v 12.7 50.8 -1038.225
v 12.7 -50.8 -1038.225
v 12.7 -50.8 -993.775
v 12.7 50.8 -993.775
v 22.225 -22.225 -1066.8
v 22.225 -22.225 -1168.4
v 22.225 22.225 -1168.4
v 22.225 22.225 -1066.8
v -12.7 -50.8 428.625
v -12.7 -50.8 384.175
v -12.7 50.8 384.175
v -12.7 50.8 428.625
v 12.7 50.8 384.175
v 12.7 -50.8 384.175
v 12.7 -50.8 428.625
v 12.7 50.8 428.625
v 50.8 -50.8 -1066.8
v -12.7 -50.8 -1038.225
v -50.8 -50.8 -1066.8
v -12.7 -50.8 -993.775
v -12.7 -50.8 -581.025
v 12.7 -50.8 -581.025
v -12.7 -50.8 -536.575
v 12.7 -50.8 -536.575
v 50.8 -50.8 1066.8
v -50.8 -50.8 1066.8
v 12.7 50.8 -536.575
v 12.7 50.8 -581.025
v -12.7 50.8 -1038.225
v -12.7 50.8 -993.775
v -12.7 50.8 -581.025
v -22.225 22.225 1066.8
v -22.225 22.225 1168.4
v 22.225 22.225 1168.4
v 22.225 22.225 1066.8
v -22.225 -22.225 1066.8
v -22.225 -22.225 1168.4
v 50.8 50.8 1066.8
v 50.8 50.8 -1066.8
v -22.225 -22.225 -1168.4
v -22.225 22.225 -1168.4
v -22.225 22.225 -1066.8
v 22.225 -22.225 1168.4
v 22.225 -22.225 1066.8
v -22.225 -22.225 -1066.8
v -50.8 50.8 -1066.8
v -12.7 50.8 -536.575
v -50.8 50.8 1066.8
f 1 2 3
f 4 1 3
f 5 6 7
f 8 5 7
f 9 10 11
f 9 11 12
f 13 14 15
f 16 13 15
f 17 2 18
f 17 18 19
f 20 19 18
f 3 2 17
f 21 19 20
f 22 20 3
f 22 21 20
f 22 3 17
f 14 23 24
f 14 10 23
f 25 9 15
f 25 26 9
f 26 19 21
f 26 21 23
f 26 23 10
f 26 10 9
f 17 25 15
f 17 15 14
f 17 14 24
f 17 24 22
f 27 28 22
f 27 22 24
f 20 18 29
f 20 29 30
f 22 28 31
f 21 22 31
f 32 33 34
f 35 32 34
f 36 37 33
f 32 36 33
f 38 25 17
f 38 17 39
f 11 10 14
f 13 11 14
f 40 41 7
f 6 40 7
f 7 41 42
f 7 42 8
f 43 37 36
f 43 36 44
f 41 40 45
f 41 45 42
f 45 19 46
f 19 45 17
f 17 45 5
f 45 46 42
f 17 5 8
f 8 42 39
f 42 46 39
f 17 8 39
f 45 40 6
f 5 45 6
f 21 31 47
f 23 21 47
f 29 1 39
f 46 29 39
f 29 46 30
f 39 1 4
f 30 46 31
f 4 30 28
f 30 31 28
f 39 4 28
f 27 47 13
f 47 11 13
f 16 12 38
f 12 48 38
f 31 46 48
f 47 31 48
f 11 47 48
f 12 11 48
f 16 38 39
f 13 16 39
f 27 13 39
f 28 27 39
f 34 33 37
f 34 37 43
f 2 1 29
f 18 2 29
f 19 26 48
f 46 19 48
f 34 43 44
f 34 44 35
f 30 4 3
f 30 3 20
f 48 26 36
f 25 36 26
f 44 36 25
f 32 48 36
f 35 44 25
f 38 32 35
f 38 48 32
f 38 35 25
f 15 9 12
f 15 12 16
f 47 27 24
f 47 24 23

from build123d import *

# Parameters (mm, degrees)
F0_W     = 101.6
F0_H     = 101.6
F1_DEPTH = 1168.4
F2_W     = 101.6
F2_H     = 101.6
F2_W_2   = 44.45
F2_H_2   = 44.45
F3_DEPTH = 101.6
F4_W     = 25.4
F4_H     = 44.45
F5_DEPTH = 101.601
F6_W     = 25.4
F6_H     = 44.45
F7_DEPTH = 101.601
F8_W     = 25.4
F8_H     = 44.45
F9_DEPTH = 101.601


# Not quite as in the source:
# - a pattern or mirror of a feature is missing from the dataset's text; its kind, count and spacing are read off the source's solid


with BuildPart() as f1:
    # F0 (on Top) → F1 (new body, symmetric)
    with BuildSketch(Plane.XY):
        Rectangle(F0_W, F0_H)
    extrude(amount=F1_DEPTH, both=True)

    # F2 (on face) → F3 (cut)
    with BuildSketch(Plane.XY.offset(1168.4)):
        Rectangle(F2_W, F2_H)
        Rectangle(F2_W_2, F2_H_2, mode=Mode.SUBTRACT)
    f3 = extrude(amount=-F3_DEPTH, mode=Mode.SUBTRACT)

    # F3_copies: F3 across plane
    add(f3.mirror(Plane(origin=(0, 0, 0), x_dir=(-1, 0, 0), z_dir=(0, 0, -1))), mode=Mode.SUBTRACT)

    # F4 (on face) → F5 (cut, through all)
    with BuildSketch(Plane.XZ.offset(50.8)):
        with Locations((0, 406.4)):
            Rectangle(F4_W, F4_H)
    extrude(amount=-F5_DEPTH, mode=Mode.SUBTRACT)

    # F6 (on face) → F7 (cut, through all)
    with BuildSketch(Plane(origin=(0, 50.8, 0), x_dir=(-1, 0, 0), z_dir=(0, 1, 0))):
        with Locations((0, -558.8)):
            Rectangle(F6_W, F6_H)
    extrude(amount=-F7_DEPTH, mode=Mode.SUBTRACT)

    # F8 (on face) → F9 (cut, through all)
    with BuildSketch(Plane(origin=(0, 50.8, 0), x_dir=(-1, 0, 0), z_dir=(0, 1, 0))):
        with Locations((0, -1016)):
            Rectangle(F8_W, F8_H)
    extrude(amount=-F9_DEPTH, mode=Mode.SUBTRACT)


solid = f1.part
